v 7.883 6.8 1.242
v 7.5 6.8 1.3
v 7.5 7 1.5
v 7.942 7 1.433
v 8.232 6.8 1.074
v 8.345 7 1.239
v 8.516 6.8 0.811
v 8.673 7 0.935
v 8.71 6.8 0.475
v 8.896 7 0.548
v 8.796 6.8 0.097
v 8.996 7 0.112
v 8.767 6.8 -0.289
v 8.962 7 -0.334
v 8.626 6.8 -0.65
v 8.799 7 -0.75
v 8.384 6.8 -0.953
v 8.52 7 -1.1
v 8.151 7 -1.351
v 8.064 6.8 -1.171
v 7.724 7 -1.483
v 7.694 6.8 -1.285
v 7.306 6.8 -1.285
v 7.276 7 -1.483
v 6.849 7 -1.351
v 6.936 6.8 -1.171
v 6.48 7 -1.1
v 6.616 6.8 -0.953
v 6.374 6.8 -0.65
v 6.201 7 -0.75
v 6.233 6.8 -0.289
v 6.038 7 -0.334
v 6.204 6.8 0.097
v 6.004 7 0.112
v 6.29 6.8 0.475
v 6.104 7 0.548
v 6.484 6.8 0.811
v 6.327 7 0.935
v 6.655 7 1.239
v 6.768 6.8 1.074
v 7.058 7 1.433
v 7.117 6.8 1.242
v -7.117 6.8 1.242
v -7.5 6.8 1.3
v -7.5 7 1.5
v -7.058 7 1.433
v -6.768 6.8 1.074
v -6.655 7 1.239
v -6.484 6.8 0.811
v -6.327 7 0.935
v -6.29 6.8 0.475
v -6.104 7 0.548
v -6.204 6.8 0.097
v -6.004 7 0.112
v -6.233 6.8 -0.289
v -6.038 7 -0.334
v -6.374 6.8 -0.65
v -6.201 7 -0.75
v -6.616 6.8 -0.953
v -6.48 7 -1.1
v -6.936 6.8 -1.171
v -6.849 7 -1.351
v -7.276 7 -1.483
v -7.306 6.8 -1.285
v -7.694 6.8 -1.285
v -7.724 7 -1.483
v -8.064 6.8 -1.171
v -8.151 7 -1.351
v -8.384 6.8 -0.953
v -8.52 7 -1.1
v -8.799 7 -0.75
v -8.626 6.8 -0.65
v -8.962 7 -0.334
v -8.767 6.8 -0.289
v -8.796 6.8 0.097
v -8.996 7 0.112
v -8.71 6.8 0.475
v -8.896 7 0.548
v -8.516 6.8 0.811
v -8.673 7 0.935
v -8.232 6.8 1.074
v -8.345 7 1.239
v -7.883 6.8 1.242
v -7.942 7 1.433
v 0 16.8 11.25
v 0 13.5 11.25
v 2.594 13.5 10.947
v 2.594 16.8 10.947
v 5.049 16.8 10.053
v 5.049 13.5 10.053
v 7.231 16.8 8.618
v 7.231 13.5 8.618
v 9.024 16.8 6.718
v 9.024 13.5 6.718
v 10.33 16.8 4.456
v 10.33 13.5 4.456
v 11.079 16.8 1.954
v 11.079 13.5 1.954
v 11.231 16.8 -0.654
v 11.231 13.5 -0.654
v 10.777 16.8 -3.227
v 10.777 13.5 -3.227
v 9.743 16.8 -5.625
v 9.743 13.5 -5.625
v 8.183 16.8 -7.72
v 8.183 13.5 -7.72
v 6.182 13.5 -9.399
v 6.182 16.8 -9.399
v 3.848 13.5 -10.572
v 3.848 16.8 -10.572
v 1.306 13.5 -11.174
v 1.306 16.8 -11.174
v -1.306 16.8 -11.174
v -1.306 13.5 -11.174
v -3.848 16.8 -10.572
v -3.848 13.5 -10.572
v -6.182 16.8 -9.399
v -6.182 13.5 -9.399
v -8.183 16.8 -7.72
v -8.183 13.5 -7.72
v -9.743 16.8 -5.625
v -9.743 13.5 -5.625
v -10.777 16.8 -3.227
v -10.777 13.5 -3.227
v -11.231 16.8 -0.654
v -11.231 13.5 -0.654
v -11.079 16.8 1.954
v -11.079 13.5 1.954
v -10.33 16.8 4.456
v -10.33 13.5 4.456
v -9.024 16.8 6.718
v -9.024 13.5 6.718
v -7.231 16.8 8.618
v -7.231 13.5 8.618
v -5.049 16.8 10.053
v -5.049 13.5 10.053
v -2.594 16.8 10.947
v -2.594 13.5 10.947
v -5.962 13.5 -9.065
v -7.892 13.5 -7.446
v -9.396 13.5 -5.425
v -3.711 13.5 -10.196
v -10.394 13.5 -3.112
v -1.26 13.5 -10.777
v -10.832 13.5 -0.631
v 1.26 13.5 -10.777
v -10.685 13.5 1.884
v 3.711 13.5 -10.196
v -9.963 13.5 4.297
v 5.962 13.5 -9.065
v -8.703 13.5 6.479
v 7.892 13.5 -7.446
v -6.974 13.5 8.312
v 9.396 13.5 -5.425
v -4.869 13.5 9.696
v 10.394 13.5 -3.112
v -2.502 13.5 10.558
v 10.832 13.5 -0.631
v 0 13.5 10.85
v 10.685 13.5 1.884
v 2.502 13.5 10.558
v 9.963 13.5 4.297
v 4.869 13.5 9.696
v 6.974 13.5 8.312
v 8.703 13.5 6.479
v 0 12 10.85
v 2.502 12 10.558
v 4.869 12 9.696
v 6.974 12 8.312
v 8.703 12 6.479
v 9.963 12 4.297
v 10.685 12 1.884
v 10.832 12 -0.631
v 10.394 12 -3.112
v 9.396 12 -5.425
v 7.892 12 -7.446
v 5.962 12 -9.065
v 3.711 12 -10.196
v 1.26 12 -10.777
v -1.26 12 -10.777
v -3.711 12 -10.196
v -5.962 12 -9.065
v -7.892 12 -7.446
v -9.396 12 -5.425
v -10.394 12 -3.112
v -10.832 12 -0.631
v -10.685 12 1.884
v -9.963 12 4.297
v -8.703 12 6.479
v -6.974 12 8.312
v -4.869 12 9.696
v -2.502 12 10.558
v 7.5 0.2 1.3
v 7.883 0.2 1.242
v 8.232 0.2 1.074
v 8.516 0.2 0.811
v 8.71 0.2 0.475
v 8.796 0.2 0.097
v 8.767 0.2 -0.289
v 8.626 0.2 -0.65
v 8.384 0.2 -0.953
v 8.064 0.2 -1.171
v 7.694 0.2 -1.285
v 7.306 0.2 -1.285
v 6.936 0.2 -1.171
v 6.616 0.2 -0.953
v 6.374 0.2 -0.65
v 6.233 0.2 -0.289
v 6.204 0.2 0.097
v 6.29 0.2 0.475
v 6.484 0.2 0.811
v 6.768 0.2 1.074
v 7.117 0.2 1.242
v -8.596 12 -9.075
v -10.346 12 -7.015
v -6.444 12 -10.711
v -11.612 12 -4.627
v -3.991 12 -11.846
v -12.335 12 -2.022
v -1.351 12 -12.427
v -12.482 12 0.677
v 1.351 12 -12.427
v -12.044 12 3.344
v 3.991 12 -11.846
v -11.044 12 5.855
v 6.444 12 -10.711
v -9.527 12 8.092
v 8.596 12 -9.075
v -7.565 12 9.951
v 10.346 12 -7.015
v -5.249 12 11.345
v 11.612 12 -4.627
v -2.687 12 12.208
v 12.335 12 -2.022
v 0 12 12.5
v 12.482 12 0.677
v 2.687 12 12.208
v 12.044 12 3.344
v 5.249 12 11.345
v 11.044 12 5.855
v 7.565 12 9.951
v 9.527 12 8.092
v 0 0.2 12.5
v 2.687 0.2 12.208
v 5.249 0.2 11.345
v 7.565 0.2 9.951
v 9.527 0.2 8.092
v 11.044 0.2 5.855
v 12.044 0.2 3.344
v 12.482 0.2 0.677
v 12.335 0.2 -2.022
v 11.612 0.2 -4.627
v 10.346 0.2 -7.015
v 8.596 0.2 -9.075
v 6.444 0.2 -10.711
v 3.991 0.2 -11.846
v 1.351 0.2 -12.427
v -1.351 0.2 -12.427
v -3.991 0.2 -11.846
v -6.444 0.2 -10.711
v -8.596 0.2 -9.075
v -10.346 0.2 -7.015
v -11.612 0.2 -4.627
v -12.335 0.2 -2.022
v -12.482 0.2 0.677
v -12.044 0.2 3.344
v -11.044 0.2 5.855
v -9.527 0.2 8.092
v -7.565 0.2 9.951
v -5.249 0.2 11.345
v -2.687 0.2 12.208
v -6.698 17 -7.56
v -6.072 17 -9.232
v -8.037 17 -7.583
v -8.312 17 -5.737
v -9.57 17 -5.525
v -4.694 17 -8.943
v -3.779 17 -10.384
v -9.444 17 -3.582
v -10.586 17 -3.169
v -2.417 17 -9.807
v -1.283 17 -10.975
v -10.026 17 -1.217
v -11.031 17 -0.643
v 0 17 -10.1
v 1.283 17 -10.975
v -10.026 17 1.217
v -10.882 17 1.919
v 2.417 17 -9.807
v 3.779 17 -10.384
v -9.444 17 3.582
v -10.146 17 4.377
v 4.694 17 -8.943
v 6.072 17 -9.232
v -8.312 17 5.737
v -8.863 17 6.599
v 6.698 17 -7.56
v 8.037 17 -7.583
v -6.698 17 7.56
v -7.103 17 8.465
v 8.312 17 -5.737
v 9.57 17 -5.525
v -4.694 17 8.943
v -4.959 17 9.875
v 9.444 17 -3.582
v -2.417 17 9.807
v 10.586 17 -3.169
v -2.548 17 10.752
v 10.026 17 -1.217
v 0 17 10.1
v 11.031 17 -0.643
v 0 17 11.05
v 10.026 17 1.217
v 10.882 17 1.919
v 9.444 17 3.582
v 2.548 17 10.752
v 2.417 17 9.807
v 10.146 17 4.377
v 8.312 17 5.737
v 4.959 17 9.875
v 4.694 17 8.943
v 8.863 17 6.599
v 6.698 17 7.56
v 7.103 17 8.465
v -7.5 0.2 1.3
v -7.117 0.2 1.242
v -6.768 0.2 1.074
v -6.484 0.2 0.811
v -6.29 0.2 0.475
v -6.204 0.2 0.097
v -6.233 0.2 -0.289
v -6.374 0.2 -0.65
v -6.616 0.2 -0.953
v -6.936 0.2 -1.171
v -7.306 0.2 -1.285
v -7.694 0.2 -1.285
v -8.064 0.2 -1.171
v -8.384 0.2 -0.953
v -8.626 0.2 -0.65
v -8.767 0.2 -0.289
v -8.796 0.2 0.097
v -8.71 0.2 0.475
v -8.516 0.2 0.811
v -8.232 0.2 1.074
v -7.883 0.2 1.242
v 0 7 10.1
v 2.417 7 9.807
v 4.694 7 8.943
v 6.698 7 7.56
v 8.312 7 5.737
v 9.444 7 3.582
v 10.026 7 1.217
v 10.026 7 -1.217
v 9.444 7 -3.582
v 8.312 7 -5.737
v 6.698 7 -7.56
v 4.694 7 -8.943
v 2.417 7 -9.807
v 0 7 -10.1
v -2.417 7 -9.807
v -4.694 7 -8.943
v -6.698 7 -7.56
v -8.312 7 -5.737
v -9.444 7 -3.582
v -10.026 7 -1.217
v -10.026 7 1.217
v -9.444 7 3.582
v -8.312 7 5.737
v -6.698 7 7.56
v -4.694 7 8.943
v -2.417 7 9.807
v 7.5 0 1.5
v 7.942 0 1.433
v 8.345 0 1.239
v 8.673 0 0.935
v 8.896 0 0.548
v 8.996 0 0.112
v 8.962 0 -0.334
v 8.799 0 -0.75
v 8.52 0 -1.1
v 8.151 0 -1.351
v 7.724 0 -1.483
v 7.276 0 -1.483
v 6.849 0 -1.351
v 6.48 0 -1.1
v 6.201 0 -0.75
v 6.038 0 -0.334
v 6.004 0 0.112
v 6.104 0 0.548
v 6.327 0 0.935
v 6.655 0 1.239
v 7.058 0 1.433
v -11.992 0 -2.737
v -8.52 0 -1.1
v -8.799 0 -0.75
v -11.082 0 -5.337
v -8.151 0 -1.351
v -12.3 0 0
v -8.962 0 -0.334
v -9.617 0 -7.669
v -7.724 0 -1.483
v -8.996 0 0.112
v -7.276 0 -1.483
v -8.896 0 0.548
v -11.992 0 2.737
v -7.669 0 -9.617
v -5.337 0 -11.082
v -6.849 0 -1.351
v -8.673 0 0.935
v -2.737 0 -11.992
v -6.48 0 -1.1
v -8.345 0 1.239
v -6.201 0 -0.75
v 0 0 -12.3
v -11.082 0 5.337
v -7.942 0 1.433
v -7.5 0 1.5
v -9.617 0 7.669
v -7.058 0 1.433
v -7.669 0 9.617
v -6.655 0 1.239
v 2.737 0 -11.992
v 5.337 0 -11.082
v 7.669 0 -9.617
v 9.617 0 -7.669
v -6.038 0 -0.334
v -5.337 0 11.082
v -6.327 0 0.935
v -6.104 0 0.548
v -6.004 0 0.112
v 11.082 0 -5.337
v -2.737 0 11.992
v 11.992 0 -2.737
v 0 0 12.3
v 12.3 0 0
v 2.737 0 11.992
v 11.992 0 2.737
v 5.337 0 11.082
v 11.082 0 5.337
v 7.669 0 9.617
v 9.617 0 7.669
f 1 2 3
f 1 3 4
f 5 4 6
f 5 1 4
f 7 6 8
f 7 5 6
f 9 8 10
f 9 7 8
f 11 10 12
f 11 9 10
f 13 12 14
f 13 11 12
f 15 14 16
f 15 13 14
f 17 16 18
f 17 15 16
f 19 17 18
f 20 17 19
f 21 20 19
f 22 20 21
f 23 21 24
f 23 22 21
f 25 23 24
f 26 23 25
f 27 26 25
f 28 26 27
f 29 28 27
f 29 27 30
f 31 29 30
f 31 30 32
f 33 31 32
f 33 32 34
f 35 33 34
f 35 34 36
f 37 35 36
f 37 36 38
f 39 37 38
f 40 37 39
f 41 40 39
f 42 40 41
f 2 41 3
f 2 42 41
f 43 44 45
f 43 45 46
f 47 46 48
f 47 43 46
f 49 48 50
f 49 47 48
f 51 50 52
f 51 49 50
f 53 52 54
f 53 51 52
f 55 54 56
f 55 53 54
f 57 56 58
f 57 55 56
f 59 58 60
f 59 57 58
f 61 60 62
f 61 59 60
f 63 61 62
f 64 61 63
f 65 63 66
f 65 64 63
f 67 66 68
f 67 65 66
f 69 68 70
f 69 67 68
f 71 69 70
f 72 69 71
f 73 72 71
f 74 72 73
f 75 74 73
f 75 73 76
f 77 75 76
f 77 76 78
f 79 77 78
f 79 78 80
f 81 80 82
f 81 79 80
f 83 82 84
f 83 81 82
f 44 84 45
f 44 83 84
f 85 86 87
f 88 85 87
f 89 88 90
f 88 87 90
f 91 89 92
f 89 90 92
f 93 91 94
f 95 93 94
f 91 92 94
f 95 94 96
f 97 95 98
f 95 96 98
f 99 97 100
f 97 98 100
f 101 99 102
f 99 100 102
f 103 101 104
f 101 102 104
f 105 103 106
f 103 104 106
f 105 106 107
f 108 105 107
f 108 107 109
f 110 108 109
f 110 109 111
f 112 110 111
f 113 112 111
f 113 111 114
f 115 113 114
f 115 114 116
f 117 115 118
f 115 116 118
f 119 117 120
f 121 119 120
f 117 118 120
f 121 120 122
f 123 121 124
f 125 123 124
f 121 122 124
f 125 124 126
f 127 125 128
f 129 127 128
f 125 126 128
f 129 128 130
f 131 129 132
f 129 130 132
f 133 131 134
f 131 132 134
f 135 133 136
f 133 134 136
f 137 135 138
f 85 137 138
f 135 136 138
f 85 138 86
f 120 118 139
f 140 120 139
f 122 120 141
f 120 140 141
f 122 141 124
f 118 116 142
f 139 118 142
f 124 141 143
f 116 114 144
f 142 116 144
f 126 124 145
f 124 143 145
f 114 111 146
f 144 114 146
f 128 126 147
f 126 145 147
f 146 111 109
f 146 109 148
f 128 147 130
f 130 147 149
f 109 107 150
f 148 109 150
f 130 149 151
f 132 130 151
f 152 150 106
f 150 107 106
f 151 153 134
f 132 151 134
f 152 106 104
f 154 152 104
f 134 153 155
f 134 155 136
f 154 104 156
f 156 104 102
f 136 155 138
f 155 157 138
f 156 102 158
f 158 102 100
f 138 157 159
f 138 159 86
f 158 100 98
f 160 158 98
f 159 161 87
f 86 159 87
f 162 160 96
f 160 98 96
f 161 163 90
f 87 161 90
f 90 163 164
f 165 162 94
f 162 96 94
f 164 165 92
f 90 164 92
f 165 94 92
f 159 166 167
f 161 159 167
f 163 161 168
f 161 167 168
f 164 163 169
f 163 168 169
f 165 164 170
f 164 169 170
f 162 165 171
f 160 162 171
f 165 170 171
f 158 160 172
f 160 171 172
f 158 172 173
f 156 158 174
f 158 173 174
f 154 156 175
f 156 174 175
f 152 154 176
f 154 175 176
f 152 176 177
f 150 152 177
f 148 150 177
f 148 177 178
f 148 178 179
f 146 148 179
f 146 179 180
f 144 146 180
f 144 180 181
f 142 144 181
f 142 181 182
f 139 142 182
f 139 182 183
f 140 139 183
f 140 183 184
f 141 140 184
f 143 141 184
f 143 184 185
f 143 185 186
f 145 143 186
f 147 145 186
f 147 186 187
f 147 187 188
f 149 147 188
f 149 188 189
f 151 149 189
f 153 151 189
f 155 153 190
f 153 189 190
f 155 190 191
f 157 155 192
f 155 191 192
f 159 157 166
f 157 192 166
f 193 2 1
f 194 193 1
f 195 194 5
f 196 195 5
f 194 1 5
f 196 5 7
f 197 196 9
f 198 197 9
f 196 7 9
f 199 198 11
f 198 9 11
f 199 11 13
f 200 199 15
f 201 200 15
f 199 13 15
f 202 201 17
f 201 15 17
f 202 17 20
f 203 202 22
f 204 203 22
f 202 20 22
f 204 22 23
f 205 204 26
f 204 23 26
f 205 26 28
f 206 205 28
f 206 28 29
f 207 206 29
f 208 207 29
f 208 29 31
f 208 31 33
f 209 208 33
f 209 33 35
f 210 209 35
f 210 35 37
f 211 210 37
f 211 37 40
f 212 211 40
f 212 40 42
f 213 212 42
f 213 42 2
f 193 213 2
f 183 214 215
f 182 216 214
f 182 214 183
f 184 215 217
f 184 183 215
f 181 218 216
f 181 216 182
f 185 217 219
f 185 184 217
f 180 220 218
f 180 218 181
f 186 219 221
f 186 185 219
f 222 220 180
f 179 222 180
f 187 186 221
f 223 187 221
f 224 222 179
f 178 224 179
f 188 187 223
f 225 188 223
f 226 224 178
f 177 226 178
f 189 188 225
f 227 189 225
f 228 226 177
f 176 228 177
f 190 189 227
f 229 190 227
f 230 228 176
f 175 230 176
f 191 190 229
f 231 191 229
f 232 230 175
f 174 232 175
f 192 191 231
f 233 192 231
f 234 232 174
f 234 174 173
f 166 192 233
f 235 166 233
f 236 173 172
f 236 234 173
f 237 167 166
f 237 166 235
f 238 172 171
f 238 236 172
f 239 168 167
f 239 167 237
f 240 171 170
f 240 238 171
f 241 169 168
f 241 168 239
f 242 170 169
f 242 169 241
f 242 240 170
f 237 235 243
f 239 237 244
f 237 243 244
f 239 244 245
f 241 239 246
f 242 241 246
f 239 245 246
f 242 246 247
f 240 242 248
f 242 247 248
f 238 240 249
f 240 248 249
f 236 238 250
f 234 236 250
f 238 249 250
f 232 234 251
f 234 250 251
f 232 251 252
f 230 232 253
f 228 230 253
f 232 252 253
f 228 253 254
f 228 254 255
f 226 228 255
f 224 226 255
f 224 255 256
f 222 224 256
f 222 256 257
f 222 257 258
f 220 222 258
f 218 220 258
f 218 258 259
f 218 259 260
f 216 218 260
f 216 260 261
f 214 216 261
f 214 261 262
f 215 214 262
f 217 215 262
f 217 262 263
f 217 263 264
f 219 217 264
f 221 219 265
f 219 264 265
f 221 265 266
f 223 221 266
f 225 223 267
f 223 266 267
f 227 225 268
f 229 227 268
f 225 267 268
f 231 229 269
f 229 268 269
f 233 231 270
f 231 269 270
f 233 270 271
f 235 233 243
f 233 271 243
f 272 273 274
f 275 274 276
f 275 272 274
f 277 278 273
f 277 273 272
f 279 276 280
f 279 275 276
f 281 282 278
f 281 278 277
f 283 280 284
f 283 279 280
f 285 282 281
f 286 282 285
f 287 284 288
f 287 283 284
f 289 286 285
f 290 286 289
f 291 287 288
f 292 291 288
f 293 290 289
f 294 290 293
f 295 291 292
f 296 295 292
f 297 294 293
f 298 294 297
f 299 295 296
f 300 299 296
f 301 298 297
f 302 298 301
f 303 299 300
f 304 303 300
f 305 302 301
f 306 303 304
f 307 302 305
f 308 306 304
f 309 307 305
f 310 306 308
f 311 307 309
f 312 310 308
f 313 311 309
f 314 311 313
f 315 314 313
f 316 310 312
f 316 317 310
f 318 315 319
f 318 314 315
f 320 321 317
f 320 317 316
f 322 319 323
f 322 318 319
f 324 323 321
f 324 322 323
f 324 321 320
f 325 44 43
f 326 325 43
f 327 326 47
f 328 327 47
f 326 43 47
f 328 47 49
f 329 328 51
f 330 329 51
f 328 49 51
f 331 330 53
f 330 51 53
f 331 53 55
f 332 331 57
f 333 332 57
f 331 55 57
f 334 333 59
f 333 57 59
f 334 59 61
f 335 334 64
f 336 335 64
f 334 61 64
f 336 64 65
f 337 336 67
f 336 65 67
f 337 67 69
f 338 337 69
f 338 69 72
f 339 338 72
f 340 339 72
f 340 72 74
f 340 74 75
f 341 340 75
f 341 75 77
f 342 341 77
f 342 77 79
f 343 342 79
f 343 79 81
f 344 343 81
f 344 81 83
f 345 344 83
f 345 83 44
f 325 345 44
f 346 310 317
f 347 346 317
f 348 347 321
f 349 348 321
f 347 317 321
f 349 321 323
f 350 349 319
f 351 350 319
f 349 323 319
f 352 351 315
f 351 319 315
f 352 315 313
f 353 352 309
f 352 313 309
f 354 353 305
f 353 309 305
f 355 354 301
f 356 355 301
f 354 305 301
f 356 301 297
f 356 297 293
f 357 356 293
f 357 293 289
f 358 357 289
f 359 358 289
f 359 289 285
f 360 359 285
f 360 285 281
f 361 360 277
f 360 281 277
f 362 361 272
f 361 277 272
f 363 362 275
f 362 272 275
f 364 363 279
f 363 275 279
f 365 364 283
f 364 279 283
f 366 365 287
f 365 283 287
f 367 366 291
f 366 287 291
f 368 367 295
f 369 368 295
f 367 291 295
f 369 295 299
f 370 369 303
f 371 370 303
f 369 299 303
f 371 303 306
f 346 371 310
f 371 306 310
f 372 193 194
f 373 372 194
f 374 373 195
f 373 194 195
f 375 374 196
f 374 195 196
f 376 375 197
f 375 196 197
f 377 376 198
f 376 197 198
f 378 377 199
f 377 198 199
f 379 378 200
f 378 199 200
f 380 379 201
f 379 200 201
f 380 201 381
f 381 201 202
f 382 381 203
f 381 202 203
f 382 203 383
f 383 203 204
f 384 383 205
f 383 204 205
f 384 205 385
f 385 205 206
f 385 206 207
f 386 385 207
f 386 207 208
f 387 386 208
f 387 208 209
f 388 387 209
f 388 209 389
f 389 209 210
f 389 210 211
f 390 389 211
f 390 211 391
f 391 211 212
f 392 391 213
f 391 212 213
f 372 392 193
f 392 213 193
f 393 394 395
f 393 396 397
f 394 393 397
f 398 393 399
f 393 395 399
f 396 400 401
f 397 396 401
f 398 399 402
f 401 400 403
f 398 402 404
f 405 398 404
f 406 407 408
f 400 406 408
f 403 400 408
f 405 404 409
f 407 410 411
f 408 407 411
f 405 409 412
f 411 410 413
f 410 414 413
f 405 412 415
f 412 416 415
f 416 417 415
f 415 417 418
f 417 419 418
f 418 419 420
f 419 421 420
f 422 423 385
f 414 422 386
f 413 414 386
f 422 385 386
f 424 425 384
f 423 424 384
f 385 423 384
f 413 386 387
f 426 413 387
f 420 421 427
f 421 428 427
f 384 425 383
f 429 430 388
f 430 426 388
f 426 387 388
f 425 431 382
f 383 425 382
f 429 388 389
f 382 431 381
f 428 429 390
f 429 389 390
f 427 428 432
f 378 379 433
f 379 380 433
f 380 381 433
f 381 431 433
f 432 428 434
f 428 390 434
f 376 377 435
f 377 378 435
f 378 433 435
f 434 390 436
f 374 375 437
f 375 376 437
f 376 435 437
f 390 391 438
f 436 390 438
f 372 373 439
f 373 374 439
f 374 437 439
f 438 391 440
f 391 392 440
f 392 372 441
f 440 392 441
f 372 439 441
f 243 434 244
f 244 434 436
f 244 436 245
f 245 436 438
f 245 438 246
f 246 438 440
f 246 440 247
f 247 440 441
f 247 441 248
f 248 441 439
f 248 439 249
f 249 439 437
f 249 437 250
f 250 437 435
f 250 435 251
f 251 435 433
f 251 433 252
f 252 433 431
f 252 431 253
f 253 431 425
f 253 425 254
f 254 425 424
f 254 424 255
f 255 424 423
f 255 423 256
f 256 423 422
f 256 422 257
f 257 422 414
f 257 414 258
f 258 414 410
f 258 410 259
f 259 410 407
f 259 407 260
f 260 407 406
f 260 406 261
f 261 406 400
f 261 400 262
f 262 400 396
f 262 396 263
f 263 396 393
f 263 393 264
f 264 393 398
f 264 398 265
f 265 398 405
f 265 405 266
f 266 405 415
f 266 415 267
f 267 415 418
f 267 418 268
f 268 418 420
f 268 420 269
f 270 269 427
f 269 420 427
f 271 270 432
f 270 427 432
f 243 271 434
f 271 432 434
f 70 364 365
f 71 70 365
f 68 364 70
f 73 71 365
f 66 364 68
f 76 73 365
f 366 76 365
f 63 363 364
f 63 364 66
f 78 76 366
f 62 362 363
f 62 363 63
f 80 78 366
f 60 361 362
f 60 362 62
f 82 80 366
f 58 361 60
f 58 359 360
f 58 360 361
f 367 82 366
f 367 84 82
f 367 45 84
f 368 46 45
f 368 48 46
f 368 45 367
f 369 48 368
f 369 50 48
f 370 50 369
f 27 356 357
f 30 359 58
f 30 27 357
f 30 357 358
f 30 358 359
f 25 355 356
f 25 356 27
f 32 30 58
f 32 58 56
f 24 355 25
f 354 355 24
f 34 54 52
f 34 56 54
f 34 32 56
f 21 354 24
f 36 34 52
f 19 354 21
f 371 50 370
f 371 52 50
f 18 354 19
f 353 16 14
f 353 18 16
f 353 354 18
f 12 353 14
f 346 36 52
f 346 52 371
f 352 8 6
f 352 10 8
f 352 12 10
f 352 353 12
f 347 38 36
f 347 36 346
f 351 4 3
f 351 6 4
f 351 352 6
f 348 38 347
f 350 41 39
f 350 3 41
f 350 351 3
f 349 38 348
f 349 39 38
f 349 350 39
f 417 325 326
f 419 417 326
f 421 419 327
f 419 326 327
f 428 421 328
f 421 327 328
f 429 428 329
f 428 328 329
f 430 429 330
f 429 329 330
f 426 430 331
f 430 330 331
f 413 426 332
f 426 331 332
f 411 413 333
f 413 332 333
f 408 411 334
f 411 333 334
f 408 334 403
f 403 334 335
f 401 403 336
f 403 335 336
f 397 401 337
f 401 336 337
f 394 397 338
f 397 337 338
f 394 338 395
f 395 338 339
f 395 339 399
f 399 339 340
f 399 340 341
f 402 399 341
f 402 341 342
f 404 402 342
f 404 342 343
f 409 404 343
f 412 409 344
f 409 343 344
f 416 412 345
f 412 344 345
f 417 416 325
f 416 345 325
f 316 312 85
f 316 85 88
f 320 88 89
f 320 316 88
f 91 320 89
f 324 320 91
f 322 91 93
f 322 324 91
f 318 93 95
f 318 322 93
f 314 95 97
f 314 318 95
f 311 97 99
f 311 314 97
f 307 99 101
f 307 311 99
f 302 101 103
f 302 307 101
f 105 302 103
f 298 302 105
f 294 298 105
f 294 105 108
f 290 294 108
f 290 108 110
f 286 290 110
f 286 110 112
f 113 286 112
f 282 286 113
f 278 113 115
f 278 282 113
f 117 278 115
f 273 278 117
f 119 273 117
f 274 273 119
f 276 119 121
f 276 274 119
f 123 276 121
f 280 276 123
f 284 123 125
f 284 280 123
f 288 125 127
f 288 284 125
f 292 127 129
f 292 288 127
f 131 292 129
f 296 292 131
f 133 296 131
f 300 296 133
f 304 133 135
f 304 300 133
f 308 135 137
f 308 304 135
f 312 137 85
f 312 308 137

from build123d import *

# Parameters (mm, degrees)
SKETCH1_R           = 12.5
BOSS_EXTRUDE1_DEPTH = 17
SKETCH2_R           = 10.1
CUT_EXTRUDE1_DEPTH  = 10
SKETCH3_R           = 1.3
CUT_EXTRUDE2_DEPTH  = 10
CUT_EXTRUDE3_START  = -5
SKETCH4_R           = 12.5
SKETCH4_R_2         = 10.85
CUT_EXTRUDE3_DEPTH  = 5
BOSS_EXTRUDE2_START = -3.5
SKETCH7_R           = 11.25
SKETCH7_R_2         = 10.85
BOSS_EXTRUDE2_DEPTH = 3.5
CHAMFER1_SIZE       = 0.2


with BuildPart() as part:
    # Sketch1 → Boss-Extrude1 (new body)
    with BuildSketch(Plane(origin=(0, 0, 0), x_dir=(1, 0, 0), z_dir=(0, 1, 0))):
        with Locations(Location((0, 0, 0), (0, 0, 270))):
            Circle(SKETCH1_R)
    extrude(amount=BOSS_EXTRUDE1_DEPTH)

    # Sketch2 → Cut-Extrude1 (cut)
    with BuildSketch(Plane(origin=(0, 17, 0), x_dir=(1, 0, 0), z_dir=(0, 1, 0))):
        with Locations(Location((0, 0, 0), (0, 0, 270))):
            Circle(SKETCH2_R)
    extrude(amount=-CUT_EXTRUDE1_DEPTH, mode=Mode.SUBTRACT)

    # Sketch3 → Cut-Extrude2 (cut)
    with BuildSketch(Plane(origin=(0, 7, 0), x_dir=(1, 0, 0), z_dir=(0, 1, 0))):
        with Locations(Location((7.5, 0, 0), (0, 0, 270))):
            Circle(SKETCH3_R)
        with Locations(Location((-7.5, 0, 0), (0, 0, 270))):
            Circle(SKETCH3_R)
    extrude(amount=-CUT_EXTRUDE2_DEPTH, mode=Mode.SUBTRACT)

    # Sketch4 → Cut-Extrude3 (cut)
    with BuildSketch(Plane(origin=(0, 17, 0), x_dir=(1, 0, 0), z_dir=(0, 1, 0)).offset(CUT_EXTRUDE3_START)):
        with Locations(Location((0, 0, 0), (0, 0, 270))):
            Circle(SKETCH4_R)
        with Locations(Location((0, 0, 0), (0, 0, 270))):
            Circle(SKETCH4_R_2, mode=Mode.SUBTRACT)
    extrude(amount=CUT_EXTRUDE3_DEPTH, mode=Mode.SUBTRACT)

    # Sketch7 → Boss-Extrude2 (add)
    with BuildSketch(Plane(origin=(0, 17, 0), x_dir=(1, 0, 0), z_dir=(0, 1, 0)).offset(BOSS_EXTRUDE2_START)):
        with Locations(Location((0, 0, 0), (0, 0, 270))):
            Circle(SKETCH7_R)
        with Locations(Location((0, 0, 0), (0, 0, 270))):
            Circle(SKETCH7_R_2, mode=Mode.SUBTRACT)
    extrude(amount=BOSS_EXTRUDE2_DEPTH)

    # Chamfer1
    chamfer1_edges = [part.edges().sort_by_distance(p)[0] for p in [
        (7.5, 0, -1.3),
        (7.5, 7, -1.3),
        (-7.5, 0, -1.3),
        (-7.5, 7, -1.3),
        (0, 0, -12.5),
        (0, 17, -11.25),
    ]]
    chamfer(chamfer1_edges, length=CHAMFER1_SIZE)


solid = part.part
